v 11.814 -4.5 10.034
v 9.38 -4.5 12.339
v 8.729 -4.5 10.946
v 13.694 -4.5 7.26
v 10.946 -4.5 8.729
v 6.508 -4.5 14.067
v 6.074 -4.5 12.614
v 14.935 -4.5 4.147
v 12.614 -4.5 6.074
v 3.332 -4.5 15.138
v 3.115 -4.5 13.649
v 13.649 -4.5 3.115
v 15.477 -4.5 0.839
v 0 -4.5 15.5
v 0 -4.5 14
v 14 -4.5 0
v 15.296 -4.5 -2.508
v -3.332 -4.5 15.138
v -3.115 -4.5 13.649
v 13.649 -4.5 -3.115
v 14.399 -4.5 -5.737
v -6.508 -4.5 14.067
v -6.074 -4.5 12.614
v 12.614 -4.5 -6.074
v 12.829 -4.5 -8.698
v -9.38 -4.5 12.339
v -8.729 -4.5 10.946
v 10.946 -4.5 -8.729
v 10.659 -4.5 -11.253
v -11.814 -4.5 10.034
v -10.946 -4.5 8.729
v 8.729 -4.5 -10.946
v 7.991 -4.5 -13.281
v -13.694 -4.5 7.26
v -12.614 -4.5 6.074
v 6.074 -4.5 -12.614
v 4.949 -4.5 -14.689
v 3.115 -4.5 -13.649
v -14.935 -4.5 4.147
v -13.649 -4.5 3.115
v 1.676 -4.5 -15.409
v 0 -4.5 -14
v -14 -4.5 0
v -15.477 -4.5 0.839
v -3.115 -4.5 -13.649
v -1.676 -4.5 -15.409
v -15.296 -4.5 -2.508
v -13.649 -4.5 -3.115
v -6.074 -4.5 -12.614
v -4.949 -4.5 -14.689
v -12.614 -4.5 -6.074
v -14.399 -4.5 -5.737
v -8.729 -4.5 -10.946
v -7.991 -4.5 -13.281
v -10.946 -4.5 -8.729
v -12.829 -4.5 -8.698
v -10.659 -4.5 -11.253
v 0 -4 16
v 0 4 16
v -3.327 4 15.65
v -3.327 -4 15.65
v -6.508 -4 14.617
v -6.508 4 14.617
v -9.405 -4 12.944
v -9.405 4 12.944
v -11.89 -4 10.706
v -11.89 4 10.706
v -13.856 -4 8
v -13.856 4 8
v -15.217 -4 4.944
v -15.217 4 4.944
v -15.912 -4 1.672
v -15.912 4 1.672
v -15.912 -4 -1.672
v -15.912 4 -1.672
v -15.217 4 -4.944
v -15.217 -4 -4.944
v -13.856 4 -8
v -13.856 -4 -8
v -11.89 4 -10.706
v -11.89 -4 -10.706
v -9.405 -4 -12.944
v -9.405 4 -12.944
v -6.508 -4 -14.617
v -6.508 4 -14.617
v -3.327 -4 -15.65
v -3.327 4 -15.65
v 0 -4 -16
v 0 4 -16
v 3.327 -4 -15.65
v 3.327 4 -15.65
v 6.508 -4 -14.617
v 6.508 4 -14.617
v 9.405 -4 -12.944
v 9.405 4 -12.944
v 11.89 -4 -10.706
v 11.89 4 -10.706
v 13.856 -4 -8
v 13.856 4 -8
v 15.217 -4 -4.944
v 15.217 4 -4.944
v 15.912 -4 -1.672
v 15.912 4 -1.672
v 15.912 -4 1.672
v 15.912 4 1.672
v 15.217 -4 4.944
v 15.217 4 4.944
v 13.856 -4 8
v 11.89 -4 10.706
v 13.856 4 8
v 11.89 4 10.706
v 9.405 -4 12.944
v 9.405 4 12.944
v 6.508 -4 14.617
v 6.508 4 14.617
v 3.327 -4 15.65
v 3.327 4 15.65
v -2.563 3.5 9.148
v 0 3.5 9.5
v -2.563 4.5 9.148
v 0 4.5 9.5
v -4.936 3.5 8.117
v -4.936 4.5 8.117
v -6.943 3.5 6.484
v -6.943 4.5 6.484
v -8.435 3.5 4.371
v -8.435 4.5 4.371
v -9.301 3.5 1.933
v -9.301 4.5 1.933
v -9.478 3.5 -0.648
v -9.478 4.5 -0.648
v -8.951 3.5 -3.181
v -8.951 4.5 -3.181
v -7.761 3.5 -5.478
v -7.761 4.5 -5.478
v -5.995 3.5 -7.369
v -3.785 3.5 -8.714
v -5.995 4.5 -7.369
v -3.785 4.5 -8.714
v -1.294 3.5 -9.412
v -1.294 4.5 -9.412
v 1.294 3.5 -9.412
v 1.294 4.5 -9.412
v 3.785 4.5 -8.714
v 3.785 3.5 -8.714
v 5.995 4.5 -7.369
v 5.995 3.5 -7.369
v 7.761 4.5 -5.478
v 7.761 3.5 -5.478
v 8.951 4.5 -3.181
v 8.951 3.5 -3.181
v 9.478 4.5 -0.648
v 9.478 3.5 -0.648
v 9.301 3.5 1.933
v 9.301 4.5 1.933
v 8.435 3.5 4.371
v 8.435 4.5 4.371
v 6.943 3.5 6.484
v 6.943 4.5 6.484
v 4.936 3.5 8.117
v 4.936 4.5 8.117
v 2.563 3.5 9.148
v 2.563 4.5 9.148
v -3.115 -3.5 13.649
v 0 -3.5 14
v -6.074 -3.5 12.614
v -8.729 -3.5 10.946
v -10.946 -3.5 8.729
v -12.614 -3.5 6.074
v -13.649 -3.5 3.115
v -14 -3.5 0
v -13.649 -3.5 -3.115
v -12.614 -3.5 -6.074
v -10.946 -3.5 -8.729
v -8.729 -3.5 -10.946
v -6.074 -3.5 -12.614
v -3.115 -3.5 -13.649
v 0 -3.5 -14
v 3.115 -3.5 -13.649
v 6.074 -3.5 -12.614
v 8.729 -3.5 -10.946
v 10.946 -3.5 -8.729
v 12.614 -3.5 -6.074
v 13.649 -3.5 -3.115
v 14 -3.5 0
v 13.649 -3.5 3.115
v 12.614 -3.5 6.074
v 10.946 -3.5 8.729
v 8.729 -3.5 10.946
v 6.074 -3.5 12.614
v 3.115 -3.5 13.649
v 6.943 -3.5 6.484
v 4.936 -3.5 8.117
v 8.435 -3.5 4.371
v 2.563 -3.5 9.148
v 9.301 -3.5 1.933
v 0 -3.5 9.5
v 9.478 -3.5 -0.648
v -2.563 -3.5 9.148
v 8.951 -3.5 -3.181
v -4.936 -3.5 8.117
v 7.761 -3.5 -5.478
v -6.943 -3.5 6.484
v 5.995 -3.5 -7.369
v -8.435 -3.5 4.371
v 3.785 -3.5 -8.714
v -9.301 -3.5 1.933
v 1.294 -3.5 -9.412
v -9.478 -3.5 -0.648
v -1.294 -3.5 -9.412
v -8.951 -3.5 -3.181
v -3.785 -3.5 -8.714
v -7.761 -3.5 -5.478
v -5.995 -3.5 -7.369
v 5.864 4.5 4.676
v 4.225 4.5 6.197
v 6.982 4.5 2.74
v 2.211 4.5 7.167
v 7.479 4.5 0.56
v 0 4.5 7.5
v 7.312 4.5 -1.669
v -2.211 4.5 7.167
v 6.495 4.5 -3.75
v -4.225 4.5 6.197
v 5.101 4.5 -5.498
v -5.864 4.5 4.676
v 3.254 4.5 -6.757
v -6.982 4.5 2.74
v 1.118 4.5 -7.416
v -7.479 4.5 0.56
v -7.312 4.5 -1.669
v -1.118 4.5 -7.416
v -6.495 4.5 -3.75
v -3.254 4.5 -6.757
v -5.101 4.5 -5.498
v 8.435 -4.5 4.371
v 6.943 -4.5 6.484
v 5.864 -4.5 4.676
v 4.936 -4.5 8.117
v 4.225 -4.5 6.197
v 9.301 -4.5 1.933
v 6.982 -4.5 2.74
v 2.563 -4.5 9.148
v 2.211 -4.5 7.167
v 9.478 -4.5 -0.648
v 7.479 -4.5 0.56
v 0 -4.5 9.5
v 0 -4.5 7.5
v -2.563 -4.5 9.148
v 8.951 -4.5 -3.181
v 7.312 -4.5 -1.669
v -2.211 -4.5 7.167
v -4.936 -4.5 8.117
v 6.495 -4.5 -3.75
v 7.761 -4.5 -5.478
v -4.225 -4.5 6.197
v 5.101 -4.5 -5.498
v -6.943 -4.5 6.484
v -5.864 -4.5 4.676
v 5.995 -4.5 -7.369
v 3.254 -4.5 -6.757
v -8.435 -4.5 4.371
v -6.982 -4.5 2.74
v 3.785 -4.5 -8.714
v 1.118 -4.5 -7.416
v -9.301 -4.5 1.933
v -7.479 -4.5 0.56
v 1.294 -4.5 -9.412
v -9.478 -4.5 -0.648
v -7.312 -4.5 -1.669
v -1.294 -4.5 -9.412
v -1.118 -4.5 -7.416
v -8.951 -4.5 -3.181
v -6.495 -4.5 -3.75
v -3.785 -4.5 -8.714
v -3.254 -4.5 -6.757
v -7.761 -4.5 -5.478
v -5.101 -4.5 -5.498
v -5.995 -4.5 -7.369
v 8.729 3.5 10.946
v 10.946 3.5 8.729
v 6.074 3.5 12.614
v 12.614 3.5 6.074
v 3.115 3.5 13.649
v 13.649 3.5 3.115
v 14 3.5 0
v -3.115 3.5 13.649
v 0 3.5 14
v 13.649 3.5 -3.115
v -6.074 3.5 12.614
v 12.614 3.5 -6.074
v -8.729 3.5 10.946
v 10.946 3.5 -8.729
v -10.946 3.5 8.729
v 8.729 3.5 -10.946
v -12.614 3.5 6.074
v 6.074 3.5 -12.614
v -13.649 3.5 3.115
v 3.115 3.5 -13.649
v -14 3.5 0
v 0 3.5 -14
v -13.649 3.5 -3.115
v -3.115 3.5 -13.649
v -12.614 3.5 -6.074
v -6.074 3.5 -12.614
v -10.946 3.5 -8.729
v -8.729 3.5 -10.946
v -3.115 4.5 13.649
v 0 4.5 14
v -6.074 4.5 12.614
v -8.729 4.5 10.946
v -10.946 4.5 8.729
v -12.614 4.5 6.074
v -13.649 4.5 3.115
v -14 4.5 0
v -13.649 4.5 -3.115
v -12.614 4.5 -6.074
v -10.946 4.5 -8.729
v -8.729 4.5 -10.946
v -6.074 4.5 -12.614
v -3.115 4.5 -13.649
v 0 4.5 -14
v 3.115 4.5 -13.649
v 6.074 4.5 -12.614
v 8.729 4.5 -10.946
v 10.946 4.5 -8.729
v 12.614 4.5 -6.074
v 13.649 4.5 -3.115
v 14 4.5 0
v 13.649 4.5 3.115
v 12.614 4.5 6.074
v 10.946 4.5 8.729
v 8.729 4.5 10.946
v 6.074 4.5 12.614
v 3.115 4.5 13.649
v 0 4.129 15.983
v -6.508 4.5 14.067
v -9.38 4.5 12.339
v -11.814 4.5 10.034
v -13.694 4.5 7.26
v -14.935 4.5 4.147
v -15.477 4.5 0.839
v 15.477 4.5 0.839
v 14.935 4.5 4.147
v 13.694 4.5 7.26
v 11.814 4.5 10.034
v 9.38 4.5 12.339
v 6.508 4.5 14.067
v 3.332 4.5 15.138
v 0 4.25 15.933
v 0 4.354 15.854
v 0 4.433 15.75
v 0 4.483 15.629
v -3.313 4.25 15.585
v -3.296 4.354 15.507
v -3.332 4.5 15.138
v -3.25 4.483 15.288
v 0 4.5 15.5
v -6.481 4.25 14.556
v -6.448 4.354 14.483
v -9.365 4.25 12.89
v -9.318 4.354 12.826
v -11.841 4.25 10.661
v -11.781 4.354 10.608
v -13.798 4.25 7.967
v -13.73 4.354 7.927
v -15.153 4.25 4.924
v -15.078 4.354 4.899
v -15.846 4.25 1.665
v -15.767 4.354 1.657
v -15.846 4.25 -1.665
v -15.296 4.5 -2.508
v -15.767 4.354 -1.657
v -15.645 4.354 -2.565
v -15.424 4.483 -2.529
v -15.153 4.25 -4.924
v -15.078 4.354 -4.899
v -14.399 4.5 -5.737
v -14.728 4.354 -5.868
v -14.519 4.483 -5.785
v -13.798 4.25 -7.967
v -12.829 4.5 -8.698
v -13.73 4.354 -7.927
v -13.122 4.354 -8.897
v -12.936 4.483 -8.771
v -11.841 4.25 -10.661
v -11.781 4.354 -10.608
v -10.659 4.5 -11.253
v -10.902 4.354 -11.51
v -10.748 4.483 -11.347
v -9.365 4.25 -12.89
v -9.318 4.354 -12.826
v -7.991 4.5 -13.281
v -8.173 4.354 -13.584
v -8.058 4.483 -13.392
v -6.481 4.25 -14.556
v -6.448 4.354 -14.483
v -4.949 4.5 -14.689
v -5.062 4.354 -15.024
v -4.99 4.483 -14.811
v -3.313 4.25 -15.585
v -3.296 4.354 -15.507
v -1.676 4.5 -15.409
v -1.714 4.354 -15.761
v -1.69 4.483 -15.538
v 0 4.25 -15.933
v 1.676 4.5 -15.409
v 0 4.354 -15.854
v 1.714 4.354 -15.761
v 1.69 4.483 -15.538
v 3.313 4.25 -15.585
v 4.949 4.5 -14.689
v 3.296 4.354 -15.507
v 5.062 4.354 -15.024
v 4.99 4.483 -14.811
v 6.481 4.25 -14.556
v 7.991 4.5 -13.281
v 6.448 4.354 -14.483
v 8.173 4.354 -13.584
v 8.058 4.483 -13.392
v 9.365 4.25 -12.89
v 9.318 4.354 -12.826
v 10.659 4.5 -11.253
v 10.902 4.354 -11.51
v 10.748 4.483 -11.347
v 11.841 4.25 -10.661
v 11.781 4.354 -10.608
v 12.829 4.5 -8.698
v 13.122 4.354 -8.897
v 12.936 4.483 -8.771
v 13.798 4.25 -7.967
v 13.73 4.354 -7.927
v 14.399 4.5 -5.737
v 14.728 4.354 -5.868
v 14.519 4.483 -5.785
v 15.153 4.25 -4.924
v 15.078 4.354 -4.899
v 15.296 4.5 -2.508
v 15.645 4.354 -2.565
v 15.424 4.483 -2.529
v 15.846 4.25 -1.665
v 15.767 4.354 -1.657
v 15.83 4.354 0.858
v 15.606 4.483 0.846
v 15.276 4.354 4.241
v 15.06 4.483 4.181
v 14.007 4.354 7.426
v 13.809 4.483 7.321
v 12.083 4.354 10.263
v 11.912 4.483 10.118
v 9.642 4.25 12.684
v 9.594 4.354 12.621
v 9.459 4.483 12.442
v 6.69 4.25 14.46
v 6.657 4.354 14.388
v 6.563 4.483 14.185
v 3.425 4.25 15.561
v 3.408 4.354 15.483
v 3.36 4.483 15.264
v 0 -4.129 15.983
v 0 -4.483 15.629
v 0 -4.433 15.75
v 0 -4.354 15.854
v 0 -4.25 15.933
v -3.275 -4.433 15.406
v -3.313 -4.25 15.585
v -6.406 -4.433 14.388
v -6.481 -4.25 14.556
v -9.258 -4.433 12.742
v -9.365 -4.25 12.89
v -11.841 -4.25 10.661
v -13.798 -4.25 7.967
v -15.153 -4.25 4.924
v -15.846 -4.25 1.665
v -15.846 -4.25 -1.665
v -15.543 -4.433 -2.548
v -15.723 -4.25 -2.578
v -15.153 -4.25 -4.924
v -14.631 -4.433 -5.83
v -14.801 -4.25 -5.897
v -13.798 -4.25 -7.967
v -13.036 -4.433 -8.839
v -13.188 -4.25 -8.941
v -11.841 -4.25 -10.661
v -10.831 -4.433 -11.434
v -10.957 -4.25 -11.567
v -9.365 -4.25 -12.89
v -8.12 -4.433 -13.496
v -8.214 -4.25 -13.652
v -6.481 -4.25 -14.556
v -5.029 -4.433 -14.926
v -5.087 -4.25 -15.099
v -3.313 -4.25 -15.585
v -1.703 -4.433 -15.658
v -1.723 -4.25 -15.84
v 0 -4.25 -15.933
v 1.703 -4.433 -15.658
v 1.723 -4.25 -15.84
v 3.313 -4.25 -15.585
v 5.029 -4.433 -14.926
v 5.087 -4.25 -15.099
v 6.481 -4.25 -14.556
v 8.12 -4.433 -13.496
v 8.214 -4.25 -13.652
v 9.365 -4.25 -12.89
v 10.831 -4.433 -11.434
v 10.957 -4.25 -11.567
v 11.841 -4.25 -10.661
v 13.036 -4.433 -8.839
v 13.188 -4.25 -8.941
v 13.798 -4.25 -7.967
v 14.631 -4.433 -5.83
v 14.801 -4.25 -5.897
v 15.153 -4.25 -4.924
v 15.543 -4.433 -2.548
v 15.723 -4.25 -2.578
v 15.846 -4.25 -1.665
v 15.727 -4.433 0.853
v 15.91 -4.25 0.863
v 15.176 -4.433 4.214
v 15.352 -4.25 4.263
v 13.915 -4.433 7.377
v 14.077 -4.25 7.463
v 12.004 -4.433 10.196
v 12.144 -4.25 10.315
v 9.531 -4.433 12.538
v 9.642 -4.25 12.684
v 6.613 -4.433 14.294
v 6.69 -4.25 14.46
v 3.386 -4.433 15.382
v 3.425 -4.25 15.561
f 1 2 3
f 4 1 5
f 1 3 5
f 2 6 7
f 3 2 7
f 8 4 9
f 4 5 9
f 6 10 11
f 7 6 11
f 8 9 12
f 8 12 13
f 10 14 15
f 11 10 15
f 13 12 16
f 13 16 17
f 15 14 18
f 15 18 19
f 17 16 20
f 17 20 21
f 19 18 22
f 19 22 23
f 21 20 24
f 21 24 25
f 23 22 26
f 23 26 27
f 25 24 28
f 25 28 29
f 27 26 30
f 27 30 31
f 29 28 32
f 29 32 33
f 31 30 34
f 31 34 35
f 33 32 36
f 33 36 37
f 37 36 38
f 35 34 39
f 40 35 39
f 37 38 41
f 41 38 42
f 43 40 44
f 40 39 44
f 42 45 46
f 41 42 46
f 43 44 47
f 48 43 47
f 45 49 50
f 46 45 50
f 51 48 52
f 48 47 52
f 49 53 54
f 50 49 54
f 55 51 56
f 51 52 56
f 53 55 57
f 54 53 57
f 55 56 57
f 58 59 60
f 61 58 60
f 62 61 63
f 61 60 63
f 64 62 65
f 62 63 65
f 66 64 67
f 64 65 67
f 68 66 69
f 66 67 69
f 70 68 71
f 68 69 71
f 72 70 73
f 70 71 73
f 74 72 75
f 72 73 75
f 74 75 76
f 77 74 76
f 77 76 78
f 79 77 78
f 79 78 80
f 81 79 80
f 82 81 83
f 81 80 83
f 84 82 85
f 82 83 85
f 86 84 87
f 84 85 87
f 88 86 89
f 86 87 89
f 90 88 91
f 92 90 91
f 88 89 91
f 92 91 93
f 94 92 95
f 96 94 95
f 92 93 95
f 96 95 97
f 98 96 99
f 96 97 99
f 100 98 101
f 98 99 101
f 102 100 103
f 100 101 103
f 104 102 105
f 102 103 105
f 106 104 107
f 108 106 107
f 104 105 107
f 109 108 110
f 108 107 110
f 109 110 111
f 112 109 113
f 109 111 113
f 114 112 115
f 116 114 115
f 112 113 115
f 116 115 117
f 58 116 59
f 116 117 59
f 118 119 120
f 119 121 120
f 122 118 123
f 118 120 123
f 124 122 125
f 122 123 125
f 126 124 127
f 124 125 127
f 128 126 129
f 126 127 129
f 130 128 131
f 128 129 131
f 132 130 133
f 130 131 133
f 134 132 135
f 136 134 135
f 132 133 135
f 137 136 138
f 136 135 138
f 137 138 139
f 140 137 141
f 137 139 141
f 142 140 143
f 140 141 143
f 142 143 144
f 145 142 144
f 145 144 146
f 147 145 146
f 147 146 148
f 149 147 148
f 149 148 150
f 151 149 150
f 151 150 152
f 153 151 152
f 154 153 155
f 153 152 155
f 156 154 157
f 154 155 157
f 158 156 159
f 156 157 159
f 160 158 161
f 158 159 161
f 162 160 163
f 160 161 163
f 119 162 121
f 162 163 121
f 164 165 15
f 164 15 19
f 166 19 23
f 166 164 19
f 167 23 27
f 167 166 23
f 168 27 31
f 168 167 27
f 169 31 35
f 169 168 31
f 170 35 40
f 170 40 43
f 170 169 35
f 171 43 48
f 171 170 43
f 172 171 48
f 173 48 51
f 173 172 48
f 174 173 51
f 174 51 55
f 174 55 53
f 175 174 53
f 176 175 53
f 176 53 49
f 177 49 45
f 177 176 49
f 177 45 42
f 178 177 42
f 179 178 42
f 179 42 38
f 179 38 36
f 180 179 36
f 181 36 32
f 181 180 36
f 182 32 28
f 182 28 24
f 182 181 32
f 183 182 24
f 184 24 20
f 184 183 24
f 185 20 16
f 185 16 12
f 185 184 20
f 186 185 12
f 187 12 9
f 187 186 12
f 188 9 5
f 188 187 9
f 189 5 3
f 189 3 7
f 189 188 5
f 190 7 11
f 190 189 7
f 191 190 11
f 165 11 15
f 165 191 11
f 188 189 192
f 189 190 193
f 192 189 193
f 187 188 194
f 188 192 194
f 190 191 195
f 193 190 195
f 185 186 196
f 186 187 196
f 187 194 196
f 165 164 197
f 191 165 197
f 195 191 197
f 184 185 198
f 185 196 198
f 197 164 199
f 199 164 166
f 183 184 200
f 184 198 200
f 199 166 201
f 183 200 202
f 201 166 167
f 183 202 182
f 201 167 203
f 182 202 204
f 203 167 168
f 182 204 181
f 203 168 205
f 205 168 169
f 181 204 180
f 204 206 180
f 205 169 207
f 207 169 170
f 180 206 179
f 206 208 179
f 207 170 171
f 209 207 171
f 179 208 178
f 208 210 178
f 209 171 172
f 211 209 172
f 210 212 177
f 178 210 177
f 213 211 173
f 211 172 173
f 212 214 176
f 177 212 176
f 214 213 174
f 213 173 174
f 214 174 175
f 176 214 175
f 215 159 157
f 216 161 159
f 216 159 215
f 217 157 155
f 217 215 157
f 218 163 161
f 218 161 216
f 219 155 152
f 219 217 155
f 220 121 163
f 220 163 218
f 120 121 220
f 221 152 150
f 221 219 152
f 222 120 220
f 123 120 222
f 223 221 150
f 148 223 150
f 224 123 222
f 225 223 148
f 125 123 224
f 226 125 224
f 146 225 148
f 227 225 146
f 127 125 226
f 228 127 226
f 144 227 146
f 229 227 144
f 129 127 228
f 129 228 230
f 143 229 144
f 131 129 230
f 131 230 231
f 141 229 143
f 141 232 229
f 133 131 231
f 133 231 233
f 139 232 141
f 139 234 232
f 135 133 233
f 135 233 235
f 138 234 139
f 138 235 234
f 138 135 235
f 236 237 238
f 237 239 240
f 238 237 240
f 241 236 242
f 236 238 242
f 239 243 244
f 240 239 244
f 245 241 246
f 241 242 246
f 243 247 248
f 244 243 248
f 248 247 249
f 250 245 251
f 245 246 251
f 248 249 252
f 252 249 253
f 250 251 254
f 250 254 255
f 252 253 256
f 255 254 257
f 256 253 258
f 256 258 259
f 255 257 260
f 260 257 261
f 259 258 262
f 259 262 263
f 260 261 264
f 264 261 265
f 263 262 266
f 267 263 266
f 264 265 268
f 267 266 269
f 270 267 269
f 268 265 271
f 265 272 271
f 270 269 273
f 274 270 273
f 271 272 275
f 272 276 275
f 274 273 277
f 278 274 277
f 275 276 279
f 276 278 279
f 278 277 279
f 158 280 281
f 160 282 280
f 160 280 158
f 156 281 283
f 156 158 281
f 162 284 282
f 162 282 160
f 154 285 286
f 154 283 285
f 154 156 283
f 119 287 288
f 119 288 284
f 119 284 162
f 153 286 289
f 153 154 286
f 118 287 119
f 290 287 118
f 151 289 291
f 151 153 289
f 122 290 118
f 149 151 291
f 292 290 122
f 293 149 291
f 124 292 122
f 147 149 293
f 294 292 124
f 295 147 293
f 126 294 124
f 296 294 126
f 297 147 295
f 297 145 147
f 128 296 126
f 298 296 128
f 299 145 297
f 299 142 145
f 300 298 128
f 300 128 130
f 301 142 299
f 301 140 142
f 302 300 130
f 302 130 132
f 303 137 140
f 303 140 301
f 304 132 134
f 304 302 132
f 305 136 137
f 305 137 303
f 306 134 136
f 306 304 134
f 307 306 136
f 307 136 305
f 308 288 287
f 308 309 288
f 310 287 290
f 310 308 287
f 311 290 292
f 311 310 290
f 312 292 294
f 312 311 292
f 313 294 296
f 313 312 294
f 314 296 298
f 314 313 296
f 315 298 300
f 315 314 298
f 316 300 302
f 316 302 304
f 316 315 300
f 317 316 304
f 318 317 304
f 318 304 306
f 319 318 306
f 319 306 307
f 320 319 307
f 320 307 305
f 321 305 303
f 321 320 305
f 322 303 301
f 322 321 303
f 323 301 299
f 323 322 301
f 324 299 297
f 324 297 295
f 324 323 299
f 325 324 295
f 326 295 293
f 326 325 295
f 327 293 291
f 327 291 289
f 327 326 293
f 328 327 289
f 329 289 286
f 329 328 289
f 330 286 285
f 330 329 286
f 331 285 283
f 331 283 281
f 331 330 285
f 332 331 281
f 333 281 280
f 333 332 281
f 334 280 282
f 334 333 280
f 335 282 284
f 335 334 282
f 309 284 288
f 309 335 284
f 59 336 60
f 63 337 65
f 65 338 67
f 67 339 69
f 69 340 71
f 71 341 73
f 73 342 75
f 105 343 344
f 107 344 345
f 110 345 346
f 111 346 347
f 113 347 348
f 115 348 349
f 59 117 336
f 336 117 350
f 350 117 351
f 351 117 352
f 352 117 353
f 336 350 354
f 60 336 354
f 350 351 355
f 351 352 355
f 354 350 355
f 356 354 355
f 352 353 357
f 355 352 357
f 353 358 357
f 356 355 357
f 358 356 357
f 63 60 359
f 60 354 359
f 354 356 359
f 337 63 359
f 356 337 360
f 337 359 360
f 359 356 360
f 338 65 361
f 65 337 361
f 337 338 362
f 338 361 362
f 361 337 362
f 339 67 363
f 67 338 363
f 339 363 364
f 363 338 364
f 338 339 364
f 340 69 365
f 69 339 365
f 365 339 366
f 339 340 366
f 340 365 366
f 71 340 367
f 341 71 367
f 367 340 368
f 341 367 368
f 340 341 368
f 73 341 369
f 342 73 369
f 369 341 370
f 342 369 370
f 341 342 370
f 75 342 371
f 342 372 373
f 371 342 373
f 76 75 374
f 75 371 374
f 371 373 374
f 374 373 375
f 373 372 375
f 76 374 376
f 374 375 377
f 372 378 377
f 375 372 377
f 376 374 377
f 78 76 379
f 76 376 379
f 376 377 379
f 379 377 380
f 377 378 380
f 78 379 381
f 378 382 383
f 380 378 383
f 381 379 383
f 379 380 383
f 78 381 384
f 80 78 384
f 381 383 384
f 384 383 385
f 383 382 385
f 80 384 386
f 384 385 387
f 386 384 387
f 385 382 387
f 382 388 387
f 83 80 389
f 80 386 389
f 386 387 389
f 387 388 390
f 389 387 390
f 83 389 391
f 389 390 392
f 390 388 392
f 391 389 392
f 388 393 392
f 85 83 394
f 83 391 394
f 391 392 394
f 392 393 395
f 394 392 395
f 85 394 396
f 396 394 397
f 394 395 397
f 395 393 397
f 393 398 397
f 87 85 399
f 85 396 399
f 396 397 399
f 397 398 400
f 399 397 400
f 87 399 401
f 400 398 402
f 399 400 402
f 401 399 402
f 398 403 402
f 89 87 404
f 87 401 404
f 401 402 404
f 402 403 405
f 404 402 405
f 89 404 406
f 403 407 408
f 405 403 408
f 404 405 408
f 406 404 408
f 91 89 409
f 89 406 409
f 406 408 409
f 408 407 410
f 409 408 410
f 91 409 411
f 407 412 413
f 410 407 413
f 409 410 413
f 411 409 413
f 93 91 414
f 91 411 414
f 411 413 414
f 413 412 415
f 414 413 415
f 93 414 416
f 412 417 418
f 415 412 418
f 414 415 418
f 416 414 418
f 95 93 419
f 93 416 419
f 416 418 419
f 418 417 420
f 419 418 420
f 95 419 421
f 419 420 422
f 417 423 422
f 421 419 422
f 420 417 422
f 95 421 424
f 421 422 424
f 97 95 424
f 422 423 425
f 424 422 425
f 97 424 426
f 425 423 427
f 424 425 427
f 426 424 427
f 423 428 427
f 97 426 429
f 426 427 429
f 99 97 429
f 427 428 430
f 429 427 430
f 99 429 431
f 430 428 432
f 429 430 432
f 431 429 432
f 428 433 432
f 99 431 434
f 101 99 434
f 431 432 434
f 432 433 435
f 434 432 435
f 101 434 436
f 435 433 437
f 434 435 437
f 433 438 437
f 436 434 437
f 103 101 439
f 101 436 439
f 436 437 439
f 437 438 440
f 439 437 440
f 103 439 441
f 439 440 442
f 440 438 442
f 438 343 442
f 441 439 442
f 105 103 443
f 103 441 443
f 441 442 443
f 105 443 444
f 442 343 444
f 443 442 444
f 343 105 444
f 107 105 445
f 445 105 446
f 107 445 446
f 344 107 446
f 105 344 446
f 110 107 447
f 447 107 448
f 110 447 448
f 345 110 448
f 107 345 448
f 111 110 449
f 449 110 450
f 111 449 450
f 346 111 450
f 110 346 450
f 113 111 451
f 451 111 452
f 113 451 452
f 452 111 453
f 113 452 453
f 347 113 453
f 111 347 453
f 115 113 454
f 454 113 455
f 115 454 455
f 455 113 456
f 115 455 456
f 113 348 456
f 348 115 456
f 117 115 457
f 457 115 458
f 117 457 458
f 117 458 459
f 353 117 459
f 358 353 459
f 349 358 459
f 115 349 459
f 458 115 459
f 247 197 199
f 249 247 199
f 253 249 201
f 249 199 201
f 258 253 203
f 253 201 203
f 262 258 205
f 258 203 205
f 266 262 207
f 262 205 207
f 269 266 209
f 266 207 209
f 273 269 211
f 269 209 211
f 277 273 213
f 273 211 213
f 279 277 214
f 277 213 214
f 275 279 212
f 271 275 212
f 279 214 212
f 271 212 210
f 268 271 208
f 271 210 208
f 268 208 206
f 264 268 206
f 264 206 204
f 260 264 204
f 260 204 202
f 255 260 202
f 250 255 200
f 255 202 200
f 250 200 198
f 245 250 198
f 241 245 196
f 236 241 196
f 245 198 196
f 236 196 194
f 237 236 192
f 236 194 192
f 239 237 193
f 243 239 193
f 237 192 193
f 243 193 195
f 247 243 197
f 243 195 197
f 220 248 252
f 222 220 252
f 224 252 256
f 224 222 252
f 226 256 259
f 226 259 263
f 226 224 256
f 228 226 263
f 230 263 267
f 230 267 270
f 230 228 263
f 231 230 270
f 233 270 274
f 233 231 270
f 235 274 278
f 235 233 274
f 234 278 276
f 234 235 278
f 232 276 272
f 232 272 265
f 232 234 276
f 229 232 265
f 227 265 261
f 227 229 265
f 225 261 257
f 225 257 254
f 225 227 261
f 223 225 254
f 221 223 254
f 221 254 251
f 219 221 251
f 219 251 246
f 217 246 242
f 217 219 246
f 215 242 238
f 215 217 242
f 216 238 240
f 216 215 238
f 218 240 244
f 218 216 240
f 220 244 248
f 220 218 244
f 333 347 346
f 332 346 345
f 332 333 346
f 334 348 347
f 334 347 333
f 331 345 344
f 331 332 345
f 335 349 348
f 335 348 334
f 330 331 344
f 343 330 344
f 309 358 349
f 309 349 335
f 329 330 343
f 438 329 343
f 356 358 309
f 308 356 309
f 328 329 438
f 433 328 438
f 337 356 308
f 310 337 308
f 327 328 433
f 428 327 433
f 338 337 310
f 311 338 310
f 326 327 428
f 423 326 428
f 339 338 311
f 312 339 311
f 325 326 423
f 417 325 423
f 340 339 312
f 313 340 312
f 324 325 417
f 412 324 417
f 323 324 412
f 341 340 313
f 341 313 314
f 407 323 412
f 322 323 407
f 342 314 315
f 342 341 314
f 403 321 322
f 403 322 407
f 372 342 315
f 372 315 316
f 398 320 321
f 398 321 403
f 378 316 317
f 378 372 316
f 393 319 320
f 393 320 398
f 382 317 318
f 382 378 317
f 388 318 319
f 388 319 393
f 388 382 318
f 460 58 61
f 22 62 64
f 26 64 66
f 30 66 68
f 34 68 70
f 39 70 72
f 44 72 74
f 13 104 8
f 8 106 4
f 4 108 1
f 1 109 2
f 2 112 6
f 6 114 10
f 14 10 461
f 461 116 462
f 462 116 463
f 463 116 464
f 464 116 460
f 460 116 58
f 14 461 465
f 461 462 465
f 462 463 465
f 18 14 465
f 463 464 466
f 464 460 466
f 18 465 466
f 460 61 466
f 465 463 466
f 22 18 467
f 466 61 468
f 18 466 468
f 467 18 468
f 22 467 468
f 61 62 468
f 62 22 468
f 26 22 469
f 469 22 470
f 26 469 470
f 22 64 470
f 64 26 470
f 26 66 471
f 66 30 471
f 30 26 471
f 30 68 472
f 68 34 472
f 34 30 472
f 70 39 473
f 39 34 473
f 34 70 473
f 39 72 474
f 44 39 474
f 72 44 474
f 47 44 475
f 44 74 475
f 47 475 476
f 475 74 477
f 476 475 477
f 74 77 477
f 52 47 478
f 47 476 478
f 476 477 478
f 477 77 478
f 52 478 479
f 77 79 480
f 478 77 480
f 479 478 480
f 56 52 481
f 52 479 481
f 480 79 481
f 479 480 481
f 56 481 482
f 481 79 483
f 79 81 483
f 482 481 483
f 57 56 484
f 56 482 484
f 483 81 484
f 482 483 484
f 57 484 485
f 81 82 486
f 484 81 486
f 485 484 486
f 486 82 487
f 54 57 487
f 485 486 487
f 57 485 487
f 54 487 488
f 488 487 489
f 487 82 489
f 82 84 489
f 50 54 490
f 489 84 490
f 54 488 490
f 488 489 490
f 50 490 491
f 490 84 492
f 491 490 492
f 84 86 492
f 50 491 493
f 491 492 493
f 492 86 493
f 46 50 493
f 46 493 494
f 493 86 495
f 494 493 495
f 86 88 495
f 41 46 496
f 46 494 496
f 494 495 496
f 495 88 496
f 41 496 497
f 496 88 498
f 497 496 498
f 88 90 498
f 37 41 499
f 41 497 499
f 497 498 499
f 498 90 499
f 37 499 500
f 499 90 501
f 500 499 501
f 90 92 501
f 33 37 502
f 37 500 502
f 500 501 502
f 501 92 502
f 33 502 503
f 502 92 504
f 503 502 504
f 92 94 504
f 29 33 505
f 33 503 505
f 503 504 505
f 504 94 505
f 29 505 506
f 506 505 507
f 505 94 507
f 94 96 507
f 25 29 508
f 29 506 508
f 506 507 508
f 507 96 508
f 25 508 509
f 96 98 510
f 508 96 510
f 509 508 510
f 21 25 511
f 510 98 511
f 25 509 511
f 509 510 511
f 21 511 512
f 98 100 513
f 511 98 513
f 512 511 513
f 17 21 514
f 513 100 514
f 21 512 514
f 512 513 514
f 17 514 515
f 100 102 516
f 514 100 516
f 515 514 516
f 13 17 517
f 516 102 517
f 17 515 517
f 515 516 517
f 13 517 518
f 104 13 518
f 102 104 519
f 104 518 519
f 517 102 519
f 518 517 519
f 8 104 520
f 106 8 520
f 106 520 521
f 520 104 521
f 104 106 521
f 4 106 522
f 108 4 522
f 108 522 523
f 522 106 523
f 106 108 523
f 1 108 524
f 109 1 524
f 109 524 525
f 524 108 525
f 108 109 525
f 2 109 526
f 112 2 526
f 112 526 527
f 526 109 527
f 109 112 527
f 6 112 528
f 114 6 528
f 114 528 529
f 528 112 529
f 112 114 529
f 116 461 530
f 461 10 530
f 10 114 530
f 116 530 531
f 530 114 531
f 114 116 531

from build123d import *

# Parameters (mm, degrees)
DISQUE_INT_RIEUR_W              = 2
DISQUE_INT_RIEUR_H              = 9
DISQUE_EXT_RIEUR_W              = 2
DISQUE_EXT_RIEUR_H              = 9
DISQUE_INTERM_DIAIRE_W          = 4.5
DISQUE_INTERM_DIAIRE_H          = 7
CONG_1_DISQUE_EXT_RIEUR_0_5MM_R = 0.5


with BuildPart() as part:
    # Disque_Intérieur → Révolution1_Disque_Intérieur (revolve)
    with BuildSketch(Plane.XY, mode=Mode.PRIVATE) as r_volution1_disque_int_rieur_sk:
        with Locations((8.5, 0)):
            Rectangle(DISQUE_INT_RIEUR_W, DISQUE_INT_RIEUR_H)
    revolve(r_volution1_disque_int_rieur_sk.sketch.rotate(Axis((0, 4.95, 0), (0, -1, 0)), 90), axis=Axis((0, 4.95, 0), (0, -1, 0)))



with BuildPart() as body_2:
    # Disque_extérieur → Révolution2_Disque_extérieur (revolve)
    with BuildSketch(Plane.XY, mode=Mode.PRIVATE) as r_volution2_disque_ext_rieur_sk:
        with Locations((15, 0)):
            Rectangle(DISQUE_EXT_RIEUR_W, DISQUE_EXT_RIEUR_H)
    revolve(r_volution2_disque_ext_rieur_sk.sketch.rotate(Axis((0, 4.95, 0), (0, -1, 0)), 90), axis=Axis((0, 4.95, 0), (0, -1, 0)))


with BuildPart() as part_1:
    add(part.part)

    add(body_2.part)  # Révolution3_Disque_Intermédiaire merges body 2
    # Disque_Intermédiaire → Révolution3_Disque_Intermédiaire (revolve)
    with BuildSketch(Plane.XY, mode=Mode.PRIVATE) as r_volution3_disque_interm_diaire_sk:
        with Locations((11.75, 0)):
            Rectangle(DISQUE_INTERM_DIAIRE_W, DISQUE_INTERM_DIAIRE_H)
    revolve(r_volution3_disque_interm_diaire_sk.sketch.rotate(Axis((0, 4.95, 0), (0, -1, 0)), 90), axis=Axis((0, 4.95, 0), (0, -1, 0)))

    # Congé1_Disque_extérieur_0.5mm
    cong_1_disque_ext_rieur_0_5mm_edges = [part_1.edges().sort_by_distance(p)[0] for p in [
        (0, -4.5, -16),
        (0, 4.5, -16),
    ]]
    fillet(cong_1_disque_ext_rieur_0_5mm_edges, radius=CONG_1_DISQUE_EXT_RIEUR_0_5MM_R)


solid = part_1.part
